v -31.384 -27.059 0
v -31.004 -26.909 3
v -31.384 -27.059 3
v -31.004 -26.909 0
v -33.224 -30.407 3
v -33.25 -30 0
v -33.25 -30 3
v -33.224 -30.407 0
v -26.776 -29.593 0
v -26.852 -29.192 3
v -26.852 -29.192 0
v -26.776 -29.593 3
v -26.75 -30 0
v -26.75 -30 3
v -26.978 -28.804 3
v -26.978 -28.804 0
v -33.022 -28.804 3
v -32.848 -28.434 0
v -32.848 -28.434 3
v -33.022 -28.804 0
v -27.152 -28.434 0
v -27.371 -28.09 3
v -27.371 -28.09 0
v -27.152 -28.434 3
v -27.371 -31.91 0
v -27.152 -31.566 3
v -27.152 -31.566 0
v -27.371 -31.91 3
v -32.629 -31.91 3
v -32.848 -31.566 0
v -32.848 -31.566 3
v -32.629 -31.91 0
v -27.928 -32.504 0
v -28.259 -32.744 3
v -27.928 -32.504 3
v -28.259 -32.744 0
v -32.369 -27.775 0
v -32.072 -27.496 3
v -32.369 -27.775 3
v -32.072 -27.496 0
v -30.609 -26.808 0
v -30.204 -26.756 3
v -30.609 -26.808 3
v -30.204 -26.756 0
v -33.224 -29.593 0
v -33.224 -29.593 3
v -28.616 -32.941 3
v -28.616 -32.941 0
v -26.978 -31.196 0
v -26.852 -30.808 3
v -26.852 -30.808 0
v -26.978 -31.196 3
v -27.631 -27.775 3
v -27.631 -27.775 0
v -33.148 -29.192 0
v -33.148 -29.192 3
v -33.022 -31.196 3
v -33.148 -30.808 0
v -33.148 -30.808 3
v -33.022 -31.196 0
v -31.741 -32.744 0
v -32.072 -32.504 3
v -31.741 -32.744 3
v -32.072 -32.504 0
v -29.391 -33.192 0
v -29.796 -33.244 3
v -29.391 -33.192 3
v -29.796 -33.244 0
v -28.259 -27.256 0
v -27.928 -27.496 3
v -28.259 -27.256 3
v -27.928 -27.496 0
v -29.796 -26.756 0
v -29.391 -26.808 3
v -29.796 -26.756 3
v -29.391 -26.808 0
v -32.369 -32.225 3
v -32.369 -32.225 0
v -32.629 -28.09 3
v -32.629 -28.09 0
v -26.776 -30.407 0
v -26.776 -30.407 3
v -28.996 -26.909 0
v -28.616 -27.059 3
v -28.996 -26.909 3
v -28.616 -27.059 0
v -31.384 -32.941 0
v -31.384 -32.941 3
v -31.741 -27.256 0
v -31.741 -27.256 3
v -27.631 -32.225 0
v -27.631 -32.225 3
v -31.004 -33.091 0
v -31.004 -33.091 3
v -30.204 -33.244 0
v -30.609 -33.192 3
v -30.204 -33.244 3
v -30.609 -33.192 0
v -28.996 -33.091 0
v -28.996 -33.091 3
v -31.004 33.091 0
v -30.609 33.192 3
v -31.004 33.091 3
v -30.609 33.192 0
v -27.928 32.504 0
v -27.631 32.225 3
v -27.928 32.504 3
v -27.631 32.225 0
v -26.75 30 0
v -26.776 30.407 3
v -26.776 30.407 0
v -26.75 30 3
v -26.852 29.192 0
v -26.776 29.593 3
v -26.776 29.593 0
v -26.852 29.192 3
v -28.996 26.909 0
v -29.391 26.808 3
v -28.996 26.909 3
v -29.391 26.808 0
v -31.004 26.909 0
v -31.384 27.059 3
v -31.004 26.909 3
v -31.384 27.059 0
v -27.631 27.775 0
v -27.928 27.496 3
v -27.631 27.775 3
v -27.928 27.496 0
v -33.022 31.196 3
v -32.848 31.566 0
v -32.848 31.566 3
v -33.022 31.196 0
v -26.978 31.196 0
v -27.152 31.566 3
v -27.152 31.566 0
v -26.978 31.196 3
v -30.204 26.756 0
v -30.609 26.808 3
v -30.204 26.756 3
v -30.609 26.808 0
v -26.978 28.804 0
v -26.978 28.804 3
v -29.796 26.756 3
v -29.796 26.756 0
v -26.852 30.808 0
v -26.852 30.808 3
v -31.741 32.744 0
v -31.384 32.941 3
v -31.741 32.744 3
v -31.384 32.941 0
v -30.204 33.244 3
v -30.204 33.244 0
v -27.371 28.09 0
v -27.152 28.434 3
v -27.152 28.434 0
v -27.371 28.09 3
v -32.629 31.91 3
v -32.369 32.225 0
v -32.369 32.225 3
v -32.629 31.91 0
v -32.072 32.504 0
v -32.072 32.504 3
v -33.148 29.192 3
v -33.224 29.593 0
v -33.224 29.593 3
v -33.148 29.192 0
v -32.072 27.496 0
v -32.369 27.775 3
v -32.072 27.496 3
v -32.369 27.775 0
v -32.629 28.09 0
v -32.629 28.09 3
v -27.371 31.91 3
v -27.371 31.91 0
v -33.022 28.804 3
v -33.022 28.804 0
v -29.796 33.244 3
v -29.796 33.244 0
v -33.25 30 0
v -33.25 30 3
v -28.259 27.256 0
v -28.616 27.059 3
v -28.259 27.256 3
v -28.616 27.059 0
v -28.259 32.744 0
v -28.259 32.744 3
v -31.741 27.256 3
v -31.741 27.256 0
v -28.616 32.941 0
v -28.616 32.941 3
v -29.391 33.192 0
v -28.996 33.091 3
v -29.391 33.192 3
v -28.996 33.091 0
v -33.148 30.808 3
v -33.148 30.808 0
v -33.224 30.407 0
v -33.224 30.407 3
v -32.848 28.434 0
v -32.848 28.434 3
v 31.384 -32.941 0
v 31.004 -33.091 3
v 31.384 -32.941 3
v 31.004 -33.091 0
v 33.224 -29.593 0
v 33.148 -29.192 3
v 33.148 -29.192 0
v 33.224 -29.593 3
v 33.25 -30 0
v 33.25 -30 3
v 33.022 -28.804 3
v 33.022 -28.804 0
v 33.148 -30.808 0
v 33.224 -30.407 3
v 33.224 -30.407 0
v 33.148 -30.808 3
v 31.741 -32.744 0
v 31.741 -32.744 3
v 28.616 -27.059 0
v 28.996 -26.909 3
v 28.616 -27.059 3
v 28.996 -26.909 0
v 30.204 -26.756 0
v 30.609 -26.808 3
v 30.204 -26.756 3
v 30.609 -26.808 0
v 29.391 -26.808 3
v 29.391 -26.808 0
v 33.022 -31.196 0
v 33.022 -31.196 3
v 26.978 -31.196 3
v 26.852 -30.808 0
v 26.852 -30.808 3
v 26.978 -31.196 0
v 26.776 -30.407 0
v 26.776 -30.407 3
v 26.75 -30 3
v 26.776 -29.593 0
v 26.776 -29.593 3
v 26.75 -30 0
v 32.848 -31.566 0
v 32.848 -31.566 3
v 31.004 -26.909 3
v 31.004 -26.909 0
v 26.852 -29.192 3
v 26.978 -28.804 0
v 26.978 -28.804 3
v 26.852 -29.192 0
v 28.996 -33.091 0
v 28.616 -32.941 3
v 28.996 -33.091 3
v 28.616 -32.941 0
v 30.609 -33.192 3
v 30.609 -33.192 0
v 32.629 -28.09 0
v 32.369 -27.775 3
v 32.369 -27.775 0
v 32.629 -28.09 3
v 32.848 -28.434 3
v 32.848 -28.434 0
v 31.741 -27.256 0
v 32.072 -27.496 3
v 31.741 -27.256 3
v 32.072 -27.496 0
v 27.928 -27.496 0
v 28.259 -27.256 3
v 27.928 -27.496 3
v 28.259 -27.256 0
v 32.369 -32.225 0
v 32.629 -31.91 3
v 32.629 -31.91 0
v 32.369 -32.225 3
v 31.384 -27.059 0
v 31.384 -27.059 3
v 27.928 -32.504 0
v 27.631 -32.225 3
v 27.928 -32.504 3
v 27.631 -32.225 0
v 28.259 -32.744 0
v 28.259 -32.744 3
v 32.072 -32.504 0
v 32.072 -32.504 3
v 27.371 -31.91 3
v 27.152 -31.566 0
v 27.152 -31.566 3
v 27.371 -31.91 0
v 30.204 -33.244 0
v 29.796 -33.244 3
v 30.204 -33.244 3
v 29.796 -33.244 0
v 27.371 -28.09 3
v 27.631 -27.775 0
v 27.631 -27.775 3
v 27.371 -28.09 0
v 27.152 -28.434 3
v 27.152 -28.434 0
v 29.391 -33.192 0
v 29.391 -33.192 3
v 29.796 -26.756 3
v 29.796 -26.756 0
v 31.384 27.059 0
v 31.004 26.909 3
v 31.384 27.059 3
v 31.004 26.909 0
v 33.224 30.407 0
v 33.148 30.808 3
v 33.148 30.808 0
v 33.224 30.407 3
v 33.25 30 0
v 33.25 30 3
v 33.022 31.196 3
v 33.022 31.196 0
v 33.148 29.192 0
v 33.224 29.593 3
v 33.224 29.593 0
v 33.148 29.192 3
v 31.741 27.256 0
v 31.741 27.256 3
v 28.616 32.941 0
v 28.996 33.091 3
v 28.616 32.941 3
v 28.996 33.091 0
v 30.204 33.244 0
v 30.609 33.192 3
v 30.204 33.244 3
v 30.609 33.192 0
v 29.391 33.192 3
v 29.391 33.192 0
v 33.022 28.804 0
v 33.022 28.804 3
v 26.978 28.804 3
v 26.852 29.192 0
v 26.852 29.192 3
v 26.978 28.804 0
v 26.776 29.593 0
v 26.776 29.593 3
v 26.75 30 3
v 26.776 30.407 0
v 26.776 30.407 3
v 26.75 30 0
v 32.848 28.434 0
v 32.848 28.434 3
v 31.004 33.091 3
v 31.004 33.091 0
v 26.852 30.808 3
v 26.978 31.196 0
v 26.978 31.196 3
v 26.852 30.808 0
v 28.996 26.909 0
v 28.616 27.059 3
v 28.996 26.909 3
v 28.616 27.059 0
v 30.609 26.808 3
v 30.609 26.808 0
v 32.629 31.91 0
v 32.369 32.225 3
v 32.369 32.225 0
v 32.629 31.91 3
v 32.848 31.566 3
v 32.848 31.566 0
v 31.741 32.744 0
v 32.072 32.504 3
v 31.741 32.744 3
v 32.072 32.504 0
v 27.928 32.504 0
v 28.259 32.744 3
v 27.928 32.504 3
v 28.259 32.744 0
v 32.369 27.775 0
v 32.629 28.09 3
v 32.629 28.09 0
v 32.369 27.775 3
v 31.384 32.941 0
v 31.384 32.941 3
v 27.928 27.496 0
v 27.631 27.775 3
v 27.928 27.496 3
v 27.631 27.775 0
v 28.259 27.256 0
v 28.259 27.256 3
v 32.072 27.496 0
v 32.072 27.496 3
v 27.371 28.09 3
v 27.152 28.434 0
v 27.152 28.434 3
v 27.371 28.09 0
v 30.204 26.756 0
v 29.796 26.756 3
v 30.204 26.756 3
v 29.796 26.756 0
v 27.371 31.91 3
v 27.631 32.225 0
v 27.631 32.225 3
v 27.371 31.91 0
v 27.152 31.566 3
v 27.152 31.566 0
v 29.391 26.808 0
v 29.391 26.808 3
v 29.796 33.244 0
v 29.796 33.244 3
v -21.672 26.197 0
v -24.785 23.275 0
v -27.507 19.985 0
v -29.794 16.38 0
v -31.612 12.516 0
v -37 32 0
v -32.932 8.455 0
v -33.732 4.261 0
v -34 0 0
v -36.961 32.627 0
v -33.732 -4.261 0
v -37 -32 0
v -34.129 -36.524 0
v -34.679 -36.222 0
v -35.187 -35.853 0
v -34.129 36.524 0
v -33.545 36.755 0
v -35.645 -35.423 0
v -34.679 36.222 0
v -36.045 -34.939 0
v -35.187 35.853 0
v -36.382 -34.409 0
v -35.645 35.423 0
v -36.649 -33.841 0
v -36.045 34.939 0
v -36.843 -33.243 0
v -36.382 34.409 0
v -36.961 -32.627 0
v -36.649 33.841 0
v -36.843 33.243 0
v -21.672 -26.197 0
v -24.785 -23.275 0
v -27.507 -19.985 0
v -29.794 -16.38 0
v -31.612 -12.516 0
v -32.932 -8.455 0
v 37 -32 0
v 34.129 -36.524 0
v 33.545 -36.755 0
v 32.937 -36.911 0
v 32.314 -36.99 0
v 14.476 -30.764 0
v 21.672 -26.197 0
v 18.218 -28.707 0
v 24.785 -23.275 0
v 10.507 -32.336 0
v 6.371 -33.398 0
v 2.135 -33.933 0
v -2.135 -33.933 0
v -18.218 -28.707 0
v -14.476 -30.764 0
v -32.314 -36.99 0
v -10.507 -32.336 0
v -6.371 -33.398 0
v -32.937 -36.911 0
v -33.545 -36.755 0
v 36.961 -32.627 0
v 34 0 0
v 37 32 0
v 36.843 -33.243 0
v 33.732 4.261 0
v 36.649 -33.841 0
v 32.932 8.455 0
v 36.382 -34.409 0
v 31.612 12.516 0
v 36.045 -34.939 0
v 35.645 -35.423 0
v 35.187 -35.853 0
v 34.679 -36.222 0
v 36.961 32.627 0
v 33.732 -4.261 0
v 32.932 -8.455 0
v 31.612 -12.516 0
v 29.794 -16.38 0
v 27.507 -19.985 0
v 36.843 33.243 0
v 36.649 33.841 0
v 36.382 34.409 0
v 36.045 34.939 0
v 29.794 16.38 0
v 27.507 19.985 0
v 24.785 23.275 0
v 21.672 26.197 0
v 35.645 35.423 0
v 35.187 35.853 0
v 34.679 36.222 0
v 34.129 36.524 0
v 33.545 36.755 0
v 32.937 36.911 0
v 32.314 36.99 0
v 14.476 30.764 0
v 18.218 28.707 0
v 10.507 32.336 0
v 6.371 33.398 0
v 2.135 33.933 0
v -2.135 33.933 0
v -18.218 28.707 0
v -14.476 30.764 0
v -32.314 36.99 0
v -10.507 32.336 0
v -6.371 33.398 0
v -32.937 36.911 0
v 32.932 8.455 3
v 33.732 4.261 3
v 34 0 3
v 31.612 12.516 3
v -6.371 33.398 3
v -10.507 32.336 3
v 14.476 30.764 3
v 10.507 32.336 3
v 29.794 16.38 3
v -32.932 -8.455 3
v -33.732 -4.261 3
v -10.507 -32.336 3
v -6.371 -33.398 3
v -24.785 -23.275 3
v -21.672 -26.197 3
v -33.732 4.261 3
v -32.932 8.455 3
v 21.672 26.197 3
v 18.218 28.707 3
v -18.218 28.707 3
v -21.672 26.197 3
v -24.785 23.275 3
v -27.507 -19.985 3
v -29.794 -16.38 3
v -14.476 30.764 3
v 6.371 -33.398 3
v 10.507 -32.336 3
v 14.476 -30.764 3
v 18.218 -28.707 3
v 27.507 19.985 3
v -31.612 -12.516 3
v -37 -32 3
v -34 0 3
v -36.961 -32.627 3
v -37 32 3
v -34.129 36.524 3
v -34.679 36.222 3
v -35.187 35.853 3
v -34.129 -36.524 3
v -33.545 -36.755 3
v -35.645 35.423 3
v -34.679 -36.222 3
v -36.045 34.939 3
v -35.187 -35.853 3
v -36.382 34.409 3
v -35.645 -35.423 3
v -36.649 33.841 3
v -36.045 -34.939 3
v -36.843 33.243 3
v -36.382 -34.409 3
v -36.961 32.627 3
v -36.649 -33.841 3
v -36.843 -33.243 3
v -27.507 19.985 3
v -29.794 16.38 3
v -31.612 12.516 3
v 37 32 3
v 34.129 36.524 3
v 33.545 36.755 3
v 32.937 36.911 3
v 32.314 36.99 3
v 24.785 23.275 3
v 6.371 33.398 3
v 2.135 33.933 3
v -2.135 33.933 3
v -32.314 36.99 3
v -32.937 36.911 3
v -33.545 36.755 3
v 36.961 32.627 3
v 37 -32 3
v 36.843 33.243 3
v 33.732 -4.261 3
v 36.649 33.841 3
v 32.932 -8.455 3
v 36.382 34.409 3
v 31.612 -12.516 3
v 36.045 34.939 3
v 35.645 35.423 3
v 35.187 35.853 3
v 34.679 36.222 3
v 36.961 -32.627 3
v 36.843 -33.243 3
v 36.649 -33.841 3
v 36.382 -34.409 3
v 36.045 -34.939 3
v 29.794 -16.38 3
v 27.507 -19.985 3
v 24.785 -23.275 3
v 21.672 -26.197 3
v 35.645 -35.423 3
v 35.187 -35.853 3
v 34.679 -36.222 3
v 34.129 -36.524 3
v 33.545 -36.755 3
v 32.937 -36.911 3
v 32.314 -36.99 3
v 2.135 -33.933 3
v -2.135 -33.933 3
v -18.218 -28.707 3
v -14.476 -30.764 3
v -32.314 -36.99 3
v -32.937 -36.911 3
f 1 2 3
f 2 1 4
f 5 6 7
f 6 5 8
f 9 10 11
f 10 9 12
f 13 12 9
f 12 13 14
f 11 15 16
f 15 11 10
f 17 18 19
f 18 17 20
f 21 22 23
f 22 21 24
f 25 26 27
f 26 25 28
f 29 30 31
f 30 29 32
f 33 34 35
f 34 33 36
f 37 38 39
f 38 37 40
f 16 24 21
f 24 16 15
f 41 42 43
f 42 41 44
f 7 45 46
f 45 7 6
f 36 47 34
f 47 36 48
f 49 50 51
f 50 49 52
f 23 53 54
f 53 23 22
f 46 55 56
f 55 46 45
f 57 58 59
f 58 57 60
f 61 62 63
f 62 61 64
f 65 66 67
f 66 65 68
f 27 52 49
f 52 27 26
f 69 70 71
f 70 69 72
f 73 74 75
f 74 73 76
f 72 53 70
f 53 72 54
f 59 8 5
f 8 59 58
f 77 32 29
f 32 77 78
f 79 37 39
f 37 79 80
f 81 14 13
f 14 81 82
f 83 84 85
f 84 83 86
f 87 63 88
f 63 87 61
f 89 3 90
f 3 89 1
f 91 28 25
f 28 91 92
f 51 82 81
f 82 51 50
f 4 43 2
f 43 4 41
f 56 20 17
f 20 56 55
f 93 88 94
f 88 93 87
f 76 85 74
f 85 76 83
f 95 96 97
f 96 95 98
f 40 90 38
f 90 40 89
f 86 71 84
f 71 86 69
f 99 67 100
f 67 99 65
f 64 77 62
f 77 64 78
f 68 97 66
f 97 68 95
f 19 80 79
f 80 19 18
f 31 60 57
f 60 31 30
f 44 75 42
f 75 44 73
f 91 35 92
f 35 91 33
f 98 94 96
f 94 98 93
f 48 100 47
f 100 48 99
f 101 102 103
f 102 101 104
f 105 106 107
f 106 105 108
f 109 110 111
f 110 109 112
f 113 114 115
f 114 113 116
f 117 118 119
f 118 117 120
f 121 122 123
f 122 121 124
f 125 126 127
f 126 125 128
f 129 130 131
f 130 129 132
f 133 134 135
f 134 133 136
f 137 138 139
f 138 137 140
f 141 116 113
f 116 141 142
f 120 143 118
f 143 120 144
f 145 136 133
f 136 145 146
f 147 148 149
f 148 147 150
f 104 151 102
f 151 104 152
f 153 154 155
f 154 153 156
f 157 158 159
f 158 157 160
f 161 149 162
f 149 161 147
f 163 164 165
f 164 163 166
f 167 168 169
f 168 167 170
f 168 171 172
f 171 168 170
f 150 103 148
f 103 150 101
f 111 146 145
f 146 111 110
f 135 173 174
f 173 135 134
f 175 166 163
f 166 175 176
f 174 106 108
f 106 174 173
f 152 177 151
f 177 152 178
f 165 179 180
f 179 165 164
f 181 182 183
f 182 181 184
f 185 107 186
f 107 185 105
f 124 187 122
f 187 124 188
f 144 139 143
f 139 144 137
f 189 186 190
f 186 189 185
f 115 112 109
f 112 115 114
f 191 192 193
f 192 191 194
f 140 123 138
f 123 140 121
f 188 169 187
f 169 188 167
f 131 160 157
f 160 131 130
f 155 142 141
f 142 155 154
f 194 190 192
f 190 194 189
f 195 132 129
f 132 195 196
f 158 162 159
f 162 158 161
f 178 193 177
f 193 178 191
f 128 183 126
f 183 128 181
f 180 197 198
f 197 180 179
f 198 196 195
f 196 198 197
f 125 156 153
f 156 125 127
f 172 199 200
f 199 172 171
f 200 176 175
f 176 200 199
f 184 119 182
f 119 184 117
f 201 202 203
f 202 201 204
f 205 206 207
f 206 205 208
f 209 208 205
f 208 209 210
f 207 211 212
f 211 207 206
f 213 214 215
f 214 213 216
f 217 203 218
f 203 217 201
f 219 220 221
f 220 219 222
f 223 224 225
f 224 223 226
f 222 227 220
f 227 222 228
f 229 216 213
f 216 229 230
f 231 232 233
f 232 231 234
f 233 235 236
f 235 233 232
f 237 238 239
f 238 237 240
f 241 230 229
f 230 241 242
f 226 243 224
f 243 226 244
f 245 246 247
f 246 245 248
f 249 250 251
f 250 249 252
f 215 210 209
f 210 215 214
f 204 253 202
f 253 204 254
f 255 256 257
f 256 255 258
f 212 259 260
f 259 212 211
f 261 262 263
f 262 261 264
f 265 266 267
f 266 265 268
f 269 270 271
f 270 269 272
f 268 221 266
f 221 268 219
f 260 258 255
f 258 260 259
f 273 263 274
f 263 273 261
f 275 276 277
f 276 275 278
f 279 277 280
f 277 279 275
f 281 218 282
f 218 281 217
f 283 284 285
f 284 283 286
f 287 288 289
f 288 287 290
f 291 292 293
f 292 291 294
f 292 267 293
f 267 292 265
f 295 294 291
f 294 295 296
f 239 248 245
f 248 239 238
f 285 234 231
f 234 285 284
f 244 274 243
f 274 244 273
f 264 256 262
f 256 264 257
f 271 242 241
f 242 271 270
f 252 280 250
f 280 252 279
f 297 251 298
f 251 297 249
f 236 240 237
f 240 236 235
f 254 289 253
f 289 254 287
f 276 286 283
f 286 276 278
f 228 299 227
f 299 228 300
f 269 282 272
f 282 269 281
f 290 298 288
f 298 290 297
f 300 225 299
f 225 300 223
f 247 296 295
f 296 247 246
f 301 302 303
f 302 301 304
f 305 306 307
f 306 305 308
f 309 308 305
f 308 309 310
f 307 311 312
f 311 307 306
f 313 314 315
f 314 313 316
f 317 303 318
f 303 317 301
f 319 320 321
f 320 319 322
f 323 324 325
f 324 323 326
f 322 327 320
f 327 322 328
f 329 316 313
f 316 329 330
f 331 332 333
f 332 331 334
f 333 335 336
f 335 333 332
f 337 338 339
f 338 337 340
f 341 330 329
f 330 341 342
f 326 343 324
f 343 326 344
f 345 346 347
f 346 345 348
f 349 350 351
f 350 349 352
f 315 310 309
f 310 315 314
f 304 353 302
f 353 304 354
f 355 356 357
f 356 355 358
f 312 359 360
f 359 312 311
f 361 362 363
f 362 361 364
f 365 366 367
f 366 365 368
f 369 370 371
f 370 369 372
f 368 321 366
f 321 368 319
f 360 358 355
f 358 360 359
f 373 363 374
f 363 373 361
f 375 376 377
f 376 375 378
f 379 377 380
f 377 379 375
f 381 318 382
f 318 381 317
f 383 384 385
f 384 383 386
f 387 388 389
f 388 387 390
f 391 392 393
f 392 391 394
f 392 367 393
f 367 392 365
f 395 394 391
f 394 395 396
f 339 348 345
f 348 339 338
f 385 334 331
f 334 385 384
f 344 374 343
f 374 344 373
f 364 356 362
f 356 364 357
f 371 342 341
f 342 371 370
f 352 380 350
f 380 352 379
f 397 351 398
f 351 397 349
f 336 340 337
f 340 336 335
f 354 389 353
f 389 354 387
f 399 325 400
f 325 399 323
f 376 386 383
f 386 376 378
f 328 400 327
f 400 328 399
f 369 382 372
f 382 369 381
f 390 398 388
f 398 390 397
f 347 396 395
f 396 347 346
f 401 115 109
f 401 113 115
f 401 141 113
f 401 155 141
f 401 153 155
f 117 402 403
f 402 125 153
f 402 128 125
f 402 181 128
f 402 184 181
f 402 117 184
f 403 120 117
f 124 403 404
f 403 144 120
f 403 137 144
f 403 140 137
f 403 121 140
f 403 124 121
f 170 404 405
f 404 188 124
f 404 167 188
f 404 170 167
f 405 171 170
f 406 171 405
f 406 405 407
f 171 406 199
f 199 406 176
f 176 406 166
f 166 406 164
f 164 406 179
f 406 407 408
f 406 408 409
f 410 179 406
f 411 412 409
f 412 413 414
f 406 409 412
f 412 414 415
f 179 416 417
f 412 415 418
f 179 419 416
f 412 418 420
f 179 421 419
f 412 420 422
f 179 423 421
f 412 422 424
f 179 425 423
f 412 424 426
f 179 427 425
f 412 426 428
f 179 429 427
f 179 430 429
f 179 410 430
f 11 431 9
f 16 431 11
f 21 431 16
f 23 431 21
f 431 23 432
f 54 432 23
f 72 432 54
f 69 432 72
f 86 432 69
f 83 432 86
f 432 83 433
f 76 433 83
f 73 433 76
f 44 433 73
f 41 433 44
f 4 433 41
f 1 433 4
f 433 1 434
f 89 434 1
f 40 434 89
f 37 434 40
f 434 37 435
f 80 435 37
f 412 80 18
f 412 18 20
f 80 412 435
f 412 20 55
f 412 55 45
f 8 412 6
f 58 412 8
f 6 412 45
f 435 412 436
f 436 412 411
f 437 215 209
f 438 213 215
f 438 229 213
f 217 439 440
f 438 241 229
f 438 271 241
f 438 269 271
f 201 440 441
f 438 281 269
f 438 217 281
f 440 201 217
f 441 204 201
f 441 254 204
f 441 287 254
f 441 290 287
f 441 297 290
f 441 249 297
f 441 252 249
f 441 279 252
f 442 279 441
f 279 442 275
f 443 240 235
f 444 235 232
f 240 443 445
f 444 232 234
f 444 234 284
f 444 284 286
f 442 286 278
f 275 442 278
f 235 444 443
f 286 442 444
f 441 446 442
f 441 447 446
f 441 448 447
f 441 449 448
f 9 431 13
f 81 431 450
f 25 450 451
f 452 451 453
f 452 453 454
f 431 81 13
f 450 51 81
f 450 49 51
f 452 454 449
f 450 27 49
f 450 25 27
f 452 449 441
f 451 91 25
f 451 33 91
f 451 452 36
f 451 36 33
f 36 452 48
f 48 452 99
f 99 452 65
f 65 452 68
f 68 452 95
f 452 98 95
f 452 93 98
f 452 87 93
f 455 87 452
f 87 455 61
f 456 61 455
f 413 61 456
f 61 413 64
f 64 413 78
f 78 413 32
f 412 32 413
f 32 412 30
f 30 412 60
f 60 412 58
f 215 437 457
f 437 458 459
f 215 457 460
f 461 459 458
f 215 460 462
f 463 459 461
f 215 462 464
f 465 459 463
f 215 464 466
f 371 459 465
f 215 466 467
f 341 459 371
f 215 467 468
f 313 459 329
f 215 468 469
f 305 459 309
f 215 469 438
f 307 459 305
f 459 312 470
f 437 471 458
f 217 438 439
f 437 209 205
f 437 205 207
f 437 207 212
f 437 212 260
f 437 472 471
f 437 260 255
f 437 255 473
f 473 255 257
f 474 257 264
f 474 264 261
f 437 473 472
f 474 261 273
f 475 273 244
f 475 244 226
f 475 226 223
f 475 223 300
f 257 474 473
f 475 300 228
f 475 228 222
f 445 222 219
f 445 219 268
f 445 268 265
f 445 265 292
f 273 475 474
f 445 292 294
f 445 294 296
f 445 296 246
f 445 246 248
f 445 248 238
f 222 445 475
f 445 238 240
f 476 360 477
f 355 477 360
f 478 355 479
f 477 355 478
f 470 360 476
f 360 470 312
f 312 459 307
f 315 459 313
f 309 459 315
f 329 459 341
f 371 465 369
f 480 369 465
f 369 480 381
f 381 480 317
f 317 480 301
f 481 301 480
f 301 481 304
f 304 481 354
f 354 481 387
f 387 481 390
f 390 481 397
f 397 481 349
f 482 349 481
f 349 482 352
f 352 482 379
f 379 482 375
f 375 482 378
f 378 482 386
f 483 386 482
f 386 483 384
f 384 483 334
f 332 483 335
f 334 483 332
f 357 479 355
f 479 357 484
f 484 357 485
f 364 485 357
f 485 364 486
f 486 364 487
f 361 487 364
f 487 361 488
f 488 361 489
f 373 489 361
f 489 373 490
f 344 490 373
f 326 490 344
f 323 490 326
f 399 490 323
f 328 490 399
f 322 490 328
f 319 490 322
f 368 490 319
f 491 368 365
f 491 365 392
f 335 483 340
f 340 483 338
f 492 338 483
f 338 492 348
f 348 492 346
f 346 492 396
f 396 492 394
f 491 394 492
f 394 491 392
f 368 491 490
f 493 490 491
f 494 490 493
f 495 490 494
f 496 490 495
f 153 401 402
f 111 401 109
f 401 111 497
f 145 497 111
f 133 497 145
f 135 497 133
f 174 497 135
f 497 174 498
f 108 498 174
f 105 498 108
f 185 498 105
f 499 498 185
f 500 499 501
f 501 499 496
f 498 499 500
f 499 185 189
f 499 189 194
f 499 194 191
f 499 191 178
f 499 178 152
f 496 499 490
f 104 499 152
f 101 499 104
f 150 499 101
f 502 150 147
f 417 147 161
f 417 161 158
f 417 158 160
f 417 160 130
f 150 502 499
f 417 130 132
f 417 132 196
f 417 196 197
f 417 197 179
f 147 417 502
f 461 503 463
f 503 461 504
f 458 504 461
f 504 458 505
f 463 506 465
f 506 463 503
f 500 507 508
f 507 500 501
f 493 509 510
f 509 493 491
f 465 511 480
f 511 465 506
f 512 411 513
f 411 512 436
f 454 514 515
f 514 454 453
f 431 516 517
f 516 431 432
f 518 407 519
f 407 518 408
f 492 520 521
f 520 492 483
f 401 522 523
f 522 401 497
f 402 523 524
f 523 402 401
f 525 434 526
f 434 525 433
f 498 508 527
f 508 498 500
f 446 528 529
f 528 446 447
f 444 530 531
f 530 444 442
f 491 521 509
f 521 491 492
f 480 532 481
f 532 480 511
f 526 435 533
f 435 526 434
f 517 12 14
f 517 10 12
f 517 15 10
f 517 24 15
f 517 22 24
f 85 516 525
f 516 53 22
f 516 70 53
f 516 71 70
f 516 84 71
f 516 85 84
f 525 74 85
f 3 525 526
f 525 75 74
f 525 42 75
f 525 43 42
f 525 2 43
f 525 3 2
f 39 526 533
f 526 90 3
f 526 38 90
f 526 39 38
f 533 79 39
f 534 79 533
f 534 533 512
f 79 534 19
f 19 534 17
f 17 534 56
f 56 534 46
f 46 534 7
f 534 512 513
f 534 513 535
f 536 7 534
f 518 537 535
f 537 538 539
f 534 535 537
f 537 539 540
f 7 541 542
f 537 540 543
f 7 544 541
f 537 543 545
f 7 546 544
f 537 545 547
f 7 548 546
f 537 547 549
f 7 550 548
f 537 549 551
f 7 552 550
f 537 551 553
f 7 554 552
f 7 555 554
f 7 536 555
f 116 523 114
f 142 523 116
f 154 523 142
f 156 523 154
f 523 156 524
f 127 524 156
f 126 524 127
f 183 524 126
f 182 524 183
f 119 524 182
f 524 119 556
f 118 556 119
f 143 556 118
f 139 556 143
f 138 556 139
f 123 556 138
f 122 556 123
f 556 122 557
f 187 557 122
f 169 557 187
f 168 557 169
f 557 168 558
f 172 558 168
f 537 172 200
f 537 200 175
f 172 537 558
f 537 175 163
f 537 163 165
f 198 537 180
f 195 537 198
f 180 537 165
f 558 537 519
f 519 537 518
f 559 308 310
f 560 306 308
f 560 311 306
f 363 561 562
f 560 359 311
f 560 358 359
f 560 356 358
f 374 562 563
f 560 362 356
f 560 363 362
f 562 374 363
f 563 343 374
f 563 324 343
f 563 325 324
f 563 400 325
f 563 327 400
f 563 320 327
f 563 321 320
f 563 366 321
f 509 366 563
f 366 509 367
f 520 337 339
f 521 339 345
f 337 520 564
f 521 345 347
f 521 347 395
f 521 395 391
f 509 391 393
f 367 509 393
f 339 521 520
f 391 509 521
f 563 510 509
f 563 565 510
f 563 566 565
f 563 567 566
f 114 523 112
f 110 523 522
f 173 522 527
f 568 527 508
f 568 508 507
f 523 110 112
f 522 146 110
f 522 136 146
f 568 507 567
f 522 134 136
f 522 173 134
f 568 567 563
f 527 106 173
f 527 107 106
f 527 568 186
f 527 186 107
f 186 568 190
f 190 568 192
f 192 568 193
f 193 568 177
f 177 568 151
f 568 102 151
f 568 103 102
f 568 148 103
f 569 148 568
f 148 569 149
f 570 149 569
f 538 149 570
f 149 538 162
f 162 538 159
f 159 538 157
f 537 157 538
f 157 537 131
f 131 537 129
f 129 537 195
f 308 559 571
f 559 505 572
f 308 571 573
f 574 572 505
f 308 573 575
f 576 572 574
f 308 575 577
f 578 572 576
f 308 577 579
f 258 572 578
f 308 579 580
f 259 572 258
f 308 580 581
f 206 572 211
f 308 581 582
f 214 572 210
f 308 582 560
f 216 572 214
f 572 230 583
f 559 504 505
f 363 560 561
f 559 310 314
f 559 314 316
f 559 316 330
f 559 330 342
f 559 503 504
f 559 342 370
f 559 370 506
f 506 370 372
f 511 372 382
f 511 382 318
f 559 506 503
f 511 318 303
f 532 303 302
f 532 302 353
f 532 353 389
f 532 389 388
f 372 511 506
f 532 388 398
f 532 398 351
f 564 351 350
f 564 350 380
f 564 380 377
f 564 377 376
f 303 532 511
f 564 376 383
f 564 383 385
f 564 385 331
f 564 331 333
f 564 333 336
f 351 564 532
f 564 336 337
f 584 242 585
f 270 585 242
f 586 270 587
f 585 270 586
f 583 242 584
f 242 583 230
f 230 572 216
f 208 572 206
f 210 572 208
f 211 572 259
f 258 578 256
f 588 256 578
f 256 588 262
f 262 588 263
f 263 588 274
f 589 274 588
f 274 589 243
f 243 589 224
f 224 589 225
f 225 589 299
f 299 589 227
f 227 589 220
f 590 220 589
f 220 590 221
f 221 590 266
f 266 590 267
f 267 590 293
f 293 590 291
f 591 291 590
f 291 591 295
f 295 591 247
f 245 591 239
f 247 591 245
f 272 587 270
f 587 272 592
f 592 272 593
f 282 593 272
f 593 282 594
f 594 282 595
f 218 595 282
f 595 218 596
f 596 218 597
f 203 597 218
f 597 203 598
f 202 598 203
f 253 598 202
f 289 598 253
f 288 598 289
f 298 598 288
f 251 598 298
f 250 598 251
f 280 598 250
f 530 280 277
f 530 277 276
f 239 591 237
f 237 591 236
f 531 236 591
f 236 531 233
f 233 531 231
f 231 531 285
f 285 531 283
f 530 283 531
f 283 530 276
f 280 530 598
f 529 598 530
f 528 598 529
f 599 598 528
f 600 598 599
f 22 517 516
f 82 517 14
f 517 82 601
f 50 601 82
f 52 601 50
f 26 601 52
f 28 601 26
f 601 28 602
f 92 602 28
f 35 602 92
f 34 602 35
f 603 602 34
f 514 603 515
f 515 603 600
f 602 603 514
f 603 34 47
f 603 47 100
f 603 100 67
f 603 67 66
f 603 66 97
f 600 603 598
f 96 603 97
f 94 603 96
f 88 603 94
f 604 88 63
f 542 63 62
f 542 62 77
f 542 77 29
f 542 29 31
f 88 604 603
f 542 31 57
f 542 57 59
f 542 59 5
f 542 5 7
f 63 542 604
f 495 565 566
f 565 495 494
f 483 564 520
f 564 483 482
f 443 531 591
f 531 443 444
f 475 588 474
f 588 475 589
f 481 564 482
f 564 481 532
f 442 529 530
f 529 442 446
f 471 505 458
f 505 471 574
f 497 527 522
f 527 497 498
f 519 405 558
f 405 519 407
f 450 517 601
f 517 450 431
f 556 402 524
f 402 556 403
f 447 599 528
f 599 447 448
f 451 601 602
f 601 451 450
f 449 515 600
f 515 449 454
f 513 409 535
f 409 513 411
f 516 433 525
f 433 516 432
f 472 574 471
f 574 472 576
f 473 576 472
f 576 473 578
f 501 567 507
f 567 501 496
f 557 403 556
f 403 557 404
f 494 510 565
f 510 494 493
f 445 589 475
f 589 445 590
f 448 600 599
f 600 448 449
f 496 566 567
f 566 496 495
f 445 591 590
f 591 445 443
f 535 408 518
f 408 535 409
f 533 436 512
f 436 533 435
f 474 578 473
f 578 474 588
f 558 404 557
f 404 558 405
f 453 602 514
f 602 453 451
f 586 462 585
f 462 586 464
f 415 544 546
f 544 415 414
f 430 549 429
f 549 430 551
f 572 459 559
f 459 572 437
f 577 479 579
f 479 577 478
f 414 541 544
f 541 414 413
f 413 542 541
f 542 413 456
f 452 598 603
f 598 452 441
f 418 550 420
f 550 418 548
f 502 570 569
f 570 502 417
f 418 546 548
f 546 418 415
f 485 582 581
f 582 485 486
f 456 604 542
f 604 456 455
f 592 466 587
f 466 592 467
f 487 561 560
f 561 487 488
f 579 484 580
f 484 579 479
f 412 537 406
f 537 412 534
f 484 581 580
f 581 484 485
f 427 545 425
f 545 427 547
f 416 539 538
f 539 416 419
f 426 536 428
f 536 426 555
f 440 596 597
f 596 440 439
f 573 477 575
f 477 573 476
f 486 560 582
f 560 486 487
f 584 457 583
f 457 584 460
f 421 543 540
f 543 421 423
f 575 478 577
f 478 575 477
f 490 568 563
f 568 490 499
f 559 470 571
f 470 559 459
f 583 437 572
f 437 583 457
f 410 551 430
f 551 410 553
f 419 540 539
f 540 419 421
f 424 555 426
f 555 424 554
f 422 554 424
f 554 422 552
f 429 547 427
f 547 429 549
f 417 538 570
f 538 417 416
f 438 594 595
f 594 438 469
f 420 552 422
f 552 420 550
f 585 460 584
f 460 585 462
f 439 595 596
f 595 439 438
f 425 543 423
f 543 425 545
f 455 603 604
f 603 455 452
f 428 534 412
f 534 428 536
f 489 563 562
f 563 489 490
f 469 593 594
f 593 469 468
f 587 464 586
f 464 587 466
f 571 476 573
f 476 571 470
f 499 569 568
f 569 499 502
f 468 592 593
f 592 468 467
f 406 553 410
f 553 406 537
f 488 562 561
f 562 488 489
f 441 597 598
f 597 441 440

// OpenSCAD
$fn = 50;


difference() {
	union() {
		hull() {
			translate(v = [-32.0000000000, 32.0000000000, 0]) {
				cylinder(h = 3, r = 5);
			}
			translate(v = [32.0000000000, 32.0000000000, 0]) {
				cylinder(h = 3, r = 5);
			}
			translate(v = [-32.0000000000, -32.0000000000, 0]) {
				cylinder(h = 3, r = 5);
			}
			translate(v = [32.0000000000, -32.0000000000, 0]) {
				cylinder(h = 3, r = 5);
			}
		}
	}
	union() {
		#translate(v = [-30.0000000000, -30.0000000000, -100.0000000000]) {
			cylinder(h = 200, r = 3.2500000000);
		}
		#translate(v = [-30.0000000000, 30.0000000000, -100.0000000000]) {
			cylinder(h = 200, r = 3.2500000000);
		}
		#translate(v = [30.0000000000, -30.0000000000, -100.0000000000]) {
			cylinder(h = 200, r = 3.2500000000);
		}
		#translate(v = [30.0000000000, 30.0000000000, -100.0000000000]) {
			cylinder(h = 200, r = 3.2500000000);
		}
		#cylinder(h = 3, r = 34.0000000000);
	}
}
